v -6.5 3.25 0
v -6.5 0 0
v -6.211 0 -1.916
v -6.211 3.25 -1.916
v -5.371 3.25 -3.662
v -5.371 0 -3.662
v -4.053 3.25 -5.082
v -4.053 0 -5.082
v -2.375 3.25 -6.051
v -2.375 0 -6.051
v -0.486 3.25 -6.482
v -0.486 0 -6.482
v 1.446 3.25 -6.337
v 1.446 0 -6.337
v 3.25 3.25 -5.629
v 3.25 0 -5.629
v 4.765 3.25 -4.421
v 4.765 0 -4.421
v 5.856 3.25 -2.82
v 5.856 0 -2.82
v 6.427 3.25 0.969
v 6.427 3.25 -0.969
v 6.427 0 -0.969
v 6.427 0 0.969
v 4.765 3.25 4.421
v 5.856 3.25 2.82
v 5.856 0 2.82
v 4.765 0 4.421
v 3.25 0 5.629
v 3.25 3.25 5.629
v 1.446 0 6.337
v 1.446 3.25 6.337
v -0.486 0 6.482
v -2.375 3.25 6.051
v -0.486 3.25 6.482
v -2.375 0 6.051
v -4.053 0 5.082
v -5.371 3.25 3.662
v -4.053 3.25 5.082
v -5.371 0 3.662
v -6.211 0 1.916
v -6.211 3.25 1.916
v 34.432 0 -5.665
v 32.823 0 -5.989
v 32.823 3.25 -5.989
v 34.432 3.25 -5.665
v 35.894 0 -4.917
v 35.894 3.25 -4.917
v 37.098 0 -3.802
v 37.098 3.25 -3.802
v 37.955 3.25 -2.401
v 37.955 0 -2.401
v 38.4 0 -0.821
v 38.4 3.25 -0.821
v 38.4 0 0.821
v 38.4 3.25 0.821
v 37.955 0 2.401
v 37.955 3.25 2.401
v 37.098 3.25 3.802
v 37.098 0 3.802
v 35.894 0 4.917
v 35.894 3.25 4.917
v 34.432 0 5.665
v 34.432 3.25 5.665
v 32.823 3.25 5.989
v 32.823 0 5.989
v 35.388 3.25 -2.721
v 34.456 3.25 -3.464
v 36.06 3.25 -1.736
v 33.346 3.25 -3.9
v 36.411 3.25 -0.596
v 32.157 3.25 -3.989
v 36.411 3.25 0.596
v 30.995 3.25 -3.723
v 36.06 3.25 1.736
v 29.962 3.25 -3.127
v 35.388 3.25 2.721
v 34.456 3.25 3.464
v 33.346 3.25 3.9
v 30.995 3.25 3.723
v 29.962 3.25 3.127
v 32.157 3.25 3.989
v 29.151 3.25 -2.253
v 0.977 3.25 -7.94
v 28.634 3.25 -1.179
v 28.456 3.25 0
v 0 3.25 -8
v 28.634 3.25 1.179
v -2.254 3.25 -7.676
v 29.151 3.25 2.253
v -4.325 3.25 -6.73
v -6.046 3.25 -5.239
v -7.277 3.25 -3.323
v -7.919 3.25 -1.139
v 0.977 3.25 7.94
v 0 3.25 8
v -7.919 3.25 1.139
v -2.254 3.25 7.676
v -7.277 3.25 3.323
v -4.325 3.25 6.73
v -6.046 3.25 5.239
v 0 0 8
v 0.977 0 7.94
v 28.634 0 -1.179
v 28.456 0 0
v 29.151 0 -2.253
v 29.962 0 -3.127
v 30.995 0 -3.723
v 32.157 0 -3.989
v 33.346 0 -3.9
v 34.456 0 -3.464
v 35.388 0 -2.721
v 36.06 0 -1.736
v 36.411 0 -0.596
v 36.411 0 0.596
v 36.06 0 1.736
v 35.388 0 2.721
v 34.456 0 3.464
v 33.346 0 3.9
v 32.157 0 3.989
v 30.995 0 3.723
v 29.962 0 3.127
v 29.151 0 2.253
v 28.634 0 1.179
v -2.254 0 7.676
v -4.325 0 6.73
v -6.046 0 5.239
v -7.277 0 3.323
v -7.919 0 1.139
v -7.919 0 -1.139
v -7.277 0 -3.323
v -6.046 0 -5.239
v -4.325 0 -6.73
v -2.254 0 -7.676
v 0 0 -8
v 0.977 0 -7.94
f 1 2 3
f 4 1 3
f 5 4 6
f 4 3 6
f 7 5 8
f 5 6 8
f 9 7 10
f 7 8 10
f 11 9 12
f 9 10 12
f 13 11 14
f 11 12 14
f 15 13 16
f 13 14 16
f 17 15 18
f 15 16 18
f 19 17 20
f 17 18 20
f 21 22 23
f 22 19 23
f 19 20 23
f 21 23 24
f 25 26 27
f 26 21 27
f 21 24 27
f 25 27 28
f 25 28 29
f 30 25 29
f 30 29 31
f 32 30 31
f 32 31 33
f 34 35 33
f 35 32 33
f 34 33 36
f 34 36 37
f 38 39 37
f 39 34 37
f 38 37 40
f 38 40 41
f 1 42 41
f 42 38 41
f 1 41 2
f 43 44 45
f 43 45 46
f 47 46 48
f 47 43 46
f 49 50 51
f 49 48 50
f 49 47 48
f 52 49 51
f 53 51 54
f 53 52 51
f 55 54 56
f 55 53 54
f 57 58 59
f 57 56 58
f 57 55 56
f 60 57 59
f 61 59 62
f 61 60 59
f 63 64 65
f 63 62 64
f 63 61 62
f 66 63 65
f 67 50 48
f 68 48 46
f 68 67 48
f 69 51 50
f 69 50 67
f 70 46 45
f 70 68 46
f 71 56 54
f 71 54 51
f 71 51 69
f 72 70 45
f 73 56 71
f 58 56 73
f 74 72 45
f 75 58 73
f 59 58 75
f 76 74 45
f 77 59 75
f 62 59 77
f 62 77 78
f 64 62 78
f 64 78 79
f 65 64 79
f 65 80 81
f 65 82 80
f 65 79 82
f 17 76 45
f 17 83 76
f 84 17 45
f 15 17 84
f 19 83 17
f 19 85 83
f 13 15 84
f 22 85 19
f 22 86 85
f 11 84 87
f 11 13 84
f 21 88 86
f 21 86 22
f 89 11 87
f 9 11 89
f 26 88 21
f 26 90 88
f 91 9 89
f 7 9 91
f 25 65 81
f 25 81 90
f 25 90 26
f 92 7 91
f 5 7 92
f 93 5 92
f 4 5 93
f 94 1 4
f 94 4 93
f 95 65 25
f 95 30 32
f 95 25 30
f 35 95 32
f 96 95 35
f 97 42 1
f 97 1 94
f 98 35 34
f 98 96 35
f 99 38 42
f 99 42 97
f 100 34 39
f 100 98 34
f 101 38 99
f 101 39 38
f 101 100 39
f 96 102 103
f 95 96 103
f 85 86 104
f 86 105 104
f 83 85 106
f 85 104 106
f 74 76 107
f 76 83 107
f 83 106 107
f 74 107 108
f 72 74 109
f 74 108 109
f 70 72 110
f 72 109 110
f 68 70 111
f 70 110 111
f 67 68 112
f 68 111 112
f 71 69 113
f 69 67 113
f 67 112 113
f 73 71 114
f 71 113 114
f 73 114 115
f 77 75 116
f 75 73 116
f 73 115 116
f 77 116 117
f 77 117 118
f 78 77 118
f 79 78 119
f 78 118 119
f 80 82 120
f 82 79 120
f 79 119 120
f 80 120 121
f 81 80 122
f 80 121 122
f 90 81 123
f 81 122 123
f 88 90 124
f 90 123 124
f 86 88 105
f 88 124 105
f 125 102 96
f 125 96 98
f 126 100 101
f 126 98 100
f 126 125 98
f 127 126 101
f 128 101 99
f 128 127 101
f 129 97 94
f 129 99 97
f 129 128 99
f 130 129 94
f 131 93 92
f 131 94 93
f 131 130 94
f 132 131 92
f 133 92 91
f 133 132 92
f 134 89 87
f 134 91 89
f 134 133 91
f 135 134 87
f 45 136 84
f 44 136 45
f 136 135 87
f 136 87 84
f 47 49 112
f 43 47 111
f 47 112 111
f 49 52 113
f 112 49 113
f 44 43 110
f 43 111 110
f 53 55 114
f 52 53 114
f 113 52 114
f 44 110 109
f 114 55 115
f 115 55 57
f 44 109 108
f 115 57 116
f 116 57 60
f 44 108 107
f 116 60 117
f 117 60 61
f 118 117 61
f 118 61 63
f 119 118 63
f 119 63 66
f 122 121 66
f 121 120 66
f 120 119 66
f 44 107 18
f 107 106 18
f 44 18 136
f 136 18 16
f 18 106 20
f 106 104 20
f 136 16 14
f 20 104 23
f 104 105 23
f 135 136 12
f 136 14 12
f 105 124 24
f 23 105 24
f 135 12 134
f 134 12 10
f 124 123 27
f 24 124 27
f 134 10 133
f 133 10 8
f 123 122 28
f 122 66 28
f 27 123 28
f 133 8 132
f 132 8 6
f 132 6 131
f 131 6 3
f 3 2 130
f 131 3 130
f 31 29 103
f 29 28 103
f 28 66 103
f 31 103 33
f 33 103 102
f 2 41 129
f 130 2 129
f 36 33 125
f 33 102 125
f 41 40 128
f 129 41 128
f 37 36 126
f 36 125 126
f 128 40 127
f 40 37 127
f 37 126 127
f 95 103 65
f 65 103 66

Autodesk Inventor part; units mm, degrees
ref_plane "YZ Plane" through (0, 0, 0) normal (1, 0, 0) x (0, 1, 0)
ref_plane "XZ Plane" through (0, 0, 0) normal (0, 1, 0) x (-1, 0, 0)
ref_plane "XY Plane" through (0, 0, 0) normal (0, 0, 1) x (1, 0, 0)
sketch "Sketch1" plane through (0, 0, 0) normal (0, 1, 0) x (-1, 0, 0)
  circle A0 centre (0, 0) radius 6.5
  line L0 (0, 0) -> (-32.456, 0) construction
  circle A1 centre (-32.456, 0) radius 4
  arc A2 (-0.9767, -7.9402) -> (-0.9767, 7.9402) centre (0, 0) ccw
  arc A3 (-32.823, 5.9888) -> (-32.823, -5.9888) centre (-32.456, 0) ccw
  line L1 (0, 8) -> (-32.823, 5.9888)
  line L2 (0, -8) -> (-32.823, -5.9888)
  dimension "d0" = 13
  dimension "d1" = 32.456
  dimension "d2" = 8
  dimension "d3" = 16
  dimension "d4" = 12
extrude "Extrusion1" add sketch "Sketch1" along normal blind 3.25 contours L2 A3 L1 A2
properties part number "conex_llantamov"
